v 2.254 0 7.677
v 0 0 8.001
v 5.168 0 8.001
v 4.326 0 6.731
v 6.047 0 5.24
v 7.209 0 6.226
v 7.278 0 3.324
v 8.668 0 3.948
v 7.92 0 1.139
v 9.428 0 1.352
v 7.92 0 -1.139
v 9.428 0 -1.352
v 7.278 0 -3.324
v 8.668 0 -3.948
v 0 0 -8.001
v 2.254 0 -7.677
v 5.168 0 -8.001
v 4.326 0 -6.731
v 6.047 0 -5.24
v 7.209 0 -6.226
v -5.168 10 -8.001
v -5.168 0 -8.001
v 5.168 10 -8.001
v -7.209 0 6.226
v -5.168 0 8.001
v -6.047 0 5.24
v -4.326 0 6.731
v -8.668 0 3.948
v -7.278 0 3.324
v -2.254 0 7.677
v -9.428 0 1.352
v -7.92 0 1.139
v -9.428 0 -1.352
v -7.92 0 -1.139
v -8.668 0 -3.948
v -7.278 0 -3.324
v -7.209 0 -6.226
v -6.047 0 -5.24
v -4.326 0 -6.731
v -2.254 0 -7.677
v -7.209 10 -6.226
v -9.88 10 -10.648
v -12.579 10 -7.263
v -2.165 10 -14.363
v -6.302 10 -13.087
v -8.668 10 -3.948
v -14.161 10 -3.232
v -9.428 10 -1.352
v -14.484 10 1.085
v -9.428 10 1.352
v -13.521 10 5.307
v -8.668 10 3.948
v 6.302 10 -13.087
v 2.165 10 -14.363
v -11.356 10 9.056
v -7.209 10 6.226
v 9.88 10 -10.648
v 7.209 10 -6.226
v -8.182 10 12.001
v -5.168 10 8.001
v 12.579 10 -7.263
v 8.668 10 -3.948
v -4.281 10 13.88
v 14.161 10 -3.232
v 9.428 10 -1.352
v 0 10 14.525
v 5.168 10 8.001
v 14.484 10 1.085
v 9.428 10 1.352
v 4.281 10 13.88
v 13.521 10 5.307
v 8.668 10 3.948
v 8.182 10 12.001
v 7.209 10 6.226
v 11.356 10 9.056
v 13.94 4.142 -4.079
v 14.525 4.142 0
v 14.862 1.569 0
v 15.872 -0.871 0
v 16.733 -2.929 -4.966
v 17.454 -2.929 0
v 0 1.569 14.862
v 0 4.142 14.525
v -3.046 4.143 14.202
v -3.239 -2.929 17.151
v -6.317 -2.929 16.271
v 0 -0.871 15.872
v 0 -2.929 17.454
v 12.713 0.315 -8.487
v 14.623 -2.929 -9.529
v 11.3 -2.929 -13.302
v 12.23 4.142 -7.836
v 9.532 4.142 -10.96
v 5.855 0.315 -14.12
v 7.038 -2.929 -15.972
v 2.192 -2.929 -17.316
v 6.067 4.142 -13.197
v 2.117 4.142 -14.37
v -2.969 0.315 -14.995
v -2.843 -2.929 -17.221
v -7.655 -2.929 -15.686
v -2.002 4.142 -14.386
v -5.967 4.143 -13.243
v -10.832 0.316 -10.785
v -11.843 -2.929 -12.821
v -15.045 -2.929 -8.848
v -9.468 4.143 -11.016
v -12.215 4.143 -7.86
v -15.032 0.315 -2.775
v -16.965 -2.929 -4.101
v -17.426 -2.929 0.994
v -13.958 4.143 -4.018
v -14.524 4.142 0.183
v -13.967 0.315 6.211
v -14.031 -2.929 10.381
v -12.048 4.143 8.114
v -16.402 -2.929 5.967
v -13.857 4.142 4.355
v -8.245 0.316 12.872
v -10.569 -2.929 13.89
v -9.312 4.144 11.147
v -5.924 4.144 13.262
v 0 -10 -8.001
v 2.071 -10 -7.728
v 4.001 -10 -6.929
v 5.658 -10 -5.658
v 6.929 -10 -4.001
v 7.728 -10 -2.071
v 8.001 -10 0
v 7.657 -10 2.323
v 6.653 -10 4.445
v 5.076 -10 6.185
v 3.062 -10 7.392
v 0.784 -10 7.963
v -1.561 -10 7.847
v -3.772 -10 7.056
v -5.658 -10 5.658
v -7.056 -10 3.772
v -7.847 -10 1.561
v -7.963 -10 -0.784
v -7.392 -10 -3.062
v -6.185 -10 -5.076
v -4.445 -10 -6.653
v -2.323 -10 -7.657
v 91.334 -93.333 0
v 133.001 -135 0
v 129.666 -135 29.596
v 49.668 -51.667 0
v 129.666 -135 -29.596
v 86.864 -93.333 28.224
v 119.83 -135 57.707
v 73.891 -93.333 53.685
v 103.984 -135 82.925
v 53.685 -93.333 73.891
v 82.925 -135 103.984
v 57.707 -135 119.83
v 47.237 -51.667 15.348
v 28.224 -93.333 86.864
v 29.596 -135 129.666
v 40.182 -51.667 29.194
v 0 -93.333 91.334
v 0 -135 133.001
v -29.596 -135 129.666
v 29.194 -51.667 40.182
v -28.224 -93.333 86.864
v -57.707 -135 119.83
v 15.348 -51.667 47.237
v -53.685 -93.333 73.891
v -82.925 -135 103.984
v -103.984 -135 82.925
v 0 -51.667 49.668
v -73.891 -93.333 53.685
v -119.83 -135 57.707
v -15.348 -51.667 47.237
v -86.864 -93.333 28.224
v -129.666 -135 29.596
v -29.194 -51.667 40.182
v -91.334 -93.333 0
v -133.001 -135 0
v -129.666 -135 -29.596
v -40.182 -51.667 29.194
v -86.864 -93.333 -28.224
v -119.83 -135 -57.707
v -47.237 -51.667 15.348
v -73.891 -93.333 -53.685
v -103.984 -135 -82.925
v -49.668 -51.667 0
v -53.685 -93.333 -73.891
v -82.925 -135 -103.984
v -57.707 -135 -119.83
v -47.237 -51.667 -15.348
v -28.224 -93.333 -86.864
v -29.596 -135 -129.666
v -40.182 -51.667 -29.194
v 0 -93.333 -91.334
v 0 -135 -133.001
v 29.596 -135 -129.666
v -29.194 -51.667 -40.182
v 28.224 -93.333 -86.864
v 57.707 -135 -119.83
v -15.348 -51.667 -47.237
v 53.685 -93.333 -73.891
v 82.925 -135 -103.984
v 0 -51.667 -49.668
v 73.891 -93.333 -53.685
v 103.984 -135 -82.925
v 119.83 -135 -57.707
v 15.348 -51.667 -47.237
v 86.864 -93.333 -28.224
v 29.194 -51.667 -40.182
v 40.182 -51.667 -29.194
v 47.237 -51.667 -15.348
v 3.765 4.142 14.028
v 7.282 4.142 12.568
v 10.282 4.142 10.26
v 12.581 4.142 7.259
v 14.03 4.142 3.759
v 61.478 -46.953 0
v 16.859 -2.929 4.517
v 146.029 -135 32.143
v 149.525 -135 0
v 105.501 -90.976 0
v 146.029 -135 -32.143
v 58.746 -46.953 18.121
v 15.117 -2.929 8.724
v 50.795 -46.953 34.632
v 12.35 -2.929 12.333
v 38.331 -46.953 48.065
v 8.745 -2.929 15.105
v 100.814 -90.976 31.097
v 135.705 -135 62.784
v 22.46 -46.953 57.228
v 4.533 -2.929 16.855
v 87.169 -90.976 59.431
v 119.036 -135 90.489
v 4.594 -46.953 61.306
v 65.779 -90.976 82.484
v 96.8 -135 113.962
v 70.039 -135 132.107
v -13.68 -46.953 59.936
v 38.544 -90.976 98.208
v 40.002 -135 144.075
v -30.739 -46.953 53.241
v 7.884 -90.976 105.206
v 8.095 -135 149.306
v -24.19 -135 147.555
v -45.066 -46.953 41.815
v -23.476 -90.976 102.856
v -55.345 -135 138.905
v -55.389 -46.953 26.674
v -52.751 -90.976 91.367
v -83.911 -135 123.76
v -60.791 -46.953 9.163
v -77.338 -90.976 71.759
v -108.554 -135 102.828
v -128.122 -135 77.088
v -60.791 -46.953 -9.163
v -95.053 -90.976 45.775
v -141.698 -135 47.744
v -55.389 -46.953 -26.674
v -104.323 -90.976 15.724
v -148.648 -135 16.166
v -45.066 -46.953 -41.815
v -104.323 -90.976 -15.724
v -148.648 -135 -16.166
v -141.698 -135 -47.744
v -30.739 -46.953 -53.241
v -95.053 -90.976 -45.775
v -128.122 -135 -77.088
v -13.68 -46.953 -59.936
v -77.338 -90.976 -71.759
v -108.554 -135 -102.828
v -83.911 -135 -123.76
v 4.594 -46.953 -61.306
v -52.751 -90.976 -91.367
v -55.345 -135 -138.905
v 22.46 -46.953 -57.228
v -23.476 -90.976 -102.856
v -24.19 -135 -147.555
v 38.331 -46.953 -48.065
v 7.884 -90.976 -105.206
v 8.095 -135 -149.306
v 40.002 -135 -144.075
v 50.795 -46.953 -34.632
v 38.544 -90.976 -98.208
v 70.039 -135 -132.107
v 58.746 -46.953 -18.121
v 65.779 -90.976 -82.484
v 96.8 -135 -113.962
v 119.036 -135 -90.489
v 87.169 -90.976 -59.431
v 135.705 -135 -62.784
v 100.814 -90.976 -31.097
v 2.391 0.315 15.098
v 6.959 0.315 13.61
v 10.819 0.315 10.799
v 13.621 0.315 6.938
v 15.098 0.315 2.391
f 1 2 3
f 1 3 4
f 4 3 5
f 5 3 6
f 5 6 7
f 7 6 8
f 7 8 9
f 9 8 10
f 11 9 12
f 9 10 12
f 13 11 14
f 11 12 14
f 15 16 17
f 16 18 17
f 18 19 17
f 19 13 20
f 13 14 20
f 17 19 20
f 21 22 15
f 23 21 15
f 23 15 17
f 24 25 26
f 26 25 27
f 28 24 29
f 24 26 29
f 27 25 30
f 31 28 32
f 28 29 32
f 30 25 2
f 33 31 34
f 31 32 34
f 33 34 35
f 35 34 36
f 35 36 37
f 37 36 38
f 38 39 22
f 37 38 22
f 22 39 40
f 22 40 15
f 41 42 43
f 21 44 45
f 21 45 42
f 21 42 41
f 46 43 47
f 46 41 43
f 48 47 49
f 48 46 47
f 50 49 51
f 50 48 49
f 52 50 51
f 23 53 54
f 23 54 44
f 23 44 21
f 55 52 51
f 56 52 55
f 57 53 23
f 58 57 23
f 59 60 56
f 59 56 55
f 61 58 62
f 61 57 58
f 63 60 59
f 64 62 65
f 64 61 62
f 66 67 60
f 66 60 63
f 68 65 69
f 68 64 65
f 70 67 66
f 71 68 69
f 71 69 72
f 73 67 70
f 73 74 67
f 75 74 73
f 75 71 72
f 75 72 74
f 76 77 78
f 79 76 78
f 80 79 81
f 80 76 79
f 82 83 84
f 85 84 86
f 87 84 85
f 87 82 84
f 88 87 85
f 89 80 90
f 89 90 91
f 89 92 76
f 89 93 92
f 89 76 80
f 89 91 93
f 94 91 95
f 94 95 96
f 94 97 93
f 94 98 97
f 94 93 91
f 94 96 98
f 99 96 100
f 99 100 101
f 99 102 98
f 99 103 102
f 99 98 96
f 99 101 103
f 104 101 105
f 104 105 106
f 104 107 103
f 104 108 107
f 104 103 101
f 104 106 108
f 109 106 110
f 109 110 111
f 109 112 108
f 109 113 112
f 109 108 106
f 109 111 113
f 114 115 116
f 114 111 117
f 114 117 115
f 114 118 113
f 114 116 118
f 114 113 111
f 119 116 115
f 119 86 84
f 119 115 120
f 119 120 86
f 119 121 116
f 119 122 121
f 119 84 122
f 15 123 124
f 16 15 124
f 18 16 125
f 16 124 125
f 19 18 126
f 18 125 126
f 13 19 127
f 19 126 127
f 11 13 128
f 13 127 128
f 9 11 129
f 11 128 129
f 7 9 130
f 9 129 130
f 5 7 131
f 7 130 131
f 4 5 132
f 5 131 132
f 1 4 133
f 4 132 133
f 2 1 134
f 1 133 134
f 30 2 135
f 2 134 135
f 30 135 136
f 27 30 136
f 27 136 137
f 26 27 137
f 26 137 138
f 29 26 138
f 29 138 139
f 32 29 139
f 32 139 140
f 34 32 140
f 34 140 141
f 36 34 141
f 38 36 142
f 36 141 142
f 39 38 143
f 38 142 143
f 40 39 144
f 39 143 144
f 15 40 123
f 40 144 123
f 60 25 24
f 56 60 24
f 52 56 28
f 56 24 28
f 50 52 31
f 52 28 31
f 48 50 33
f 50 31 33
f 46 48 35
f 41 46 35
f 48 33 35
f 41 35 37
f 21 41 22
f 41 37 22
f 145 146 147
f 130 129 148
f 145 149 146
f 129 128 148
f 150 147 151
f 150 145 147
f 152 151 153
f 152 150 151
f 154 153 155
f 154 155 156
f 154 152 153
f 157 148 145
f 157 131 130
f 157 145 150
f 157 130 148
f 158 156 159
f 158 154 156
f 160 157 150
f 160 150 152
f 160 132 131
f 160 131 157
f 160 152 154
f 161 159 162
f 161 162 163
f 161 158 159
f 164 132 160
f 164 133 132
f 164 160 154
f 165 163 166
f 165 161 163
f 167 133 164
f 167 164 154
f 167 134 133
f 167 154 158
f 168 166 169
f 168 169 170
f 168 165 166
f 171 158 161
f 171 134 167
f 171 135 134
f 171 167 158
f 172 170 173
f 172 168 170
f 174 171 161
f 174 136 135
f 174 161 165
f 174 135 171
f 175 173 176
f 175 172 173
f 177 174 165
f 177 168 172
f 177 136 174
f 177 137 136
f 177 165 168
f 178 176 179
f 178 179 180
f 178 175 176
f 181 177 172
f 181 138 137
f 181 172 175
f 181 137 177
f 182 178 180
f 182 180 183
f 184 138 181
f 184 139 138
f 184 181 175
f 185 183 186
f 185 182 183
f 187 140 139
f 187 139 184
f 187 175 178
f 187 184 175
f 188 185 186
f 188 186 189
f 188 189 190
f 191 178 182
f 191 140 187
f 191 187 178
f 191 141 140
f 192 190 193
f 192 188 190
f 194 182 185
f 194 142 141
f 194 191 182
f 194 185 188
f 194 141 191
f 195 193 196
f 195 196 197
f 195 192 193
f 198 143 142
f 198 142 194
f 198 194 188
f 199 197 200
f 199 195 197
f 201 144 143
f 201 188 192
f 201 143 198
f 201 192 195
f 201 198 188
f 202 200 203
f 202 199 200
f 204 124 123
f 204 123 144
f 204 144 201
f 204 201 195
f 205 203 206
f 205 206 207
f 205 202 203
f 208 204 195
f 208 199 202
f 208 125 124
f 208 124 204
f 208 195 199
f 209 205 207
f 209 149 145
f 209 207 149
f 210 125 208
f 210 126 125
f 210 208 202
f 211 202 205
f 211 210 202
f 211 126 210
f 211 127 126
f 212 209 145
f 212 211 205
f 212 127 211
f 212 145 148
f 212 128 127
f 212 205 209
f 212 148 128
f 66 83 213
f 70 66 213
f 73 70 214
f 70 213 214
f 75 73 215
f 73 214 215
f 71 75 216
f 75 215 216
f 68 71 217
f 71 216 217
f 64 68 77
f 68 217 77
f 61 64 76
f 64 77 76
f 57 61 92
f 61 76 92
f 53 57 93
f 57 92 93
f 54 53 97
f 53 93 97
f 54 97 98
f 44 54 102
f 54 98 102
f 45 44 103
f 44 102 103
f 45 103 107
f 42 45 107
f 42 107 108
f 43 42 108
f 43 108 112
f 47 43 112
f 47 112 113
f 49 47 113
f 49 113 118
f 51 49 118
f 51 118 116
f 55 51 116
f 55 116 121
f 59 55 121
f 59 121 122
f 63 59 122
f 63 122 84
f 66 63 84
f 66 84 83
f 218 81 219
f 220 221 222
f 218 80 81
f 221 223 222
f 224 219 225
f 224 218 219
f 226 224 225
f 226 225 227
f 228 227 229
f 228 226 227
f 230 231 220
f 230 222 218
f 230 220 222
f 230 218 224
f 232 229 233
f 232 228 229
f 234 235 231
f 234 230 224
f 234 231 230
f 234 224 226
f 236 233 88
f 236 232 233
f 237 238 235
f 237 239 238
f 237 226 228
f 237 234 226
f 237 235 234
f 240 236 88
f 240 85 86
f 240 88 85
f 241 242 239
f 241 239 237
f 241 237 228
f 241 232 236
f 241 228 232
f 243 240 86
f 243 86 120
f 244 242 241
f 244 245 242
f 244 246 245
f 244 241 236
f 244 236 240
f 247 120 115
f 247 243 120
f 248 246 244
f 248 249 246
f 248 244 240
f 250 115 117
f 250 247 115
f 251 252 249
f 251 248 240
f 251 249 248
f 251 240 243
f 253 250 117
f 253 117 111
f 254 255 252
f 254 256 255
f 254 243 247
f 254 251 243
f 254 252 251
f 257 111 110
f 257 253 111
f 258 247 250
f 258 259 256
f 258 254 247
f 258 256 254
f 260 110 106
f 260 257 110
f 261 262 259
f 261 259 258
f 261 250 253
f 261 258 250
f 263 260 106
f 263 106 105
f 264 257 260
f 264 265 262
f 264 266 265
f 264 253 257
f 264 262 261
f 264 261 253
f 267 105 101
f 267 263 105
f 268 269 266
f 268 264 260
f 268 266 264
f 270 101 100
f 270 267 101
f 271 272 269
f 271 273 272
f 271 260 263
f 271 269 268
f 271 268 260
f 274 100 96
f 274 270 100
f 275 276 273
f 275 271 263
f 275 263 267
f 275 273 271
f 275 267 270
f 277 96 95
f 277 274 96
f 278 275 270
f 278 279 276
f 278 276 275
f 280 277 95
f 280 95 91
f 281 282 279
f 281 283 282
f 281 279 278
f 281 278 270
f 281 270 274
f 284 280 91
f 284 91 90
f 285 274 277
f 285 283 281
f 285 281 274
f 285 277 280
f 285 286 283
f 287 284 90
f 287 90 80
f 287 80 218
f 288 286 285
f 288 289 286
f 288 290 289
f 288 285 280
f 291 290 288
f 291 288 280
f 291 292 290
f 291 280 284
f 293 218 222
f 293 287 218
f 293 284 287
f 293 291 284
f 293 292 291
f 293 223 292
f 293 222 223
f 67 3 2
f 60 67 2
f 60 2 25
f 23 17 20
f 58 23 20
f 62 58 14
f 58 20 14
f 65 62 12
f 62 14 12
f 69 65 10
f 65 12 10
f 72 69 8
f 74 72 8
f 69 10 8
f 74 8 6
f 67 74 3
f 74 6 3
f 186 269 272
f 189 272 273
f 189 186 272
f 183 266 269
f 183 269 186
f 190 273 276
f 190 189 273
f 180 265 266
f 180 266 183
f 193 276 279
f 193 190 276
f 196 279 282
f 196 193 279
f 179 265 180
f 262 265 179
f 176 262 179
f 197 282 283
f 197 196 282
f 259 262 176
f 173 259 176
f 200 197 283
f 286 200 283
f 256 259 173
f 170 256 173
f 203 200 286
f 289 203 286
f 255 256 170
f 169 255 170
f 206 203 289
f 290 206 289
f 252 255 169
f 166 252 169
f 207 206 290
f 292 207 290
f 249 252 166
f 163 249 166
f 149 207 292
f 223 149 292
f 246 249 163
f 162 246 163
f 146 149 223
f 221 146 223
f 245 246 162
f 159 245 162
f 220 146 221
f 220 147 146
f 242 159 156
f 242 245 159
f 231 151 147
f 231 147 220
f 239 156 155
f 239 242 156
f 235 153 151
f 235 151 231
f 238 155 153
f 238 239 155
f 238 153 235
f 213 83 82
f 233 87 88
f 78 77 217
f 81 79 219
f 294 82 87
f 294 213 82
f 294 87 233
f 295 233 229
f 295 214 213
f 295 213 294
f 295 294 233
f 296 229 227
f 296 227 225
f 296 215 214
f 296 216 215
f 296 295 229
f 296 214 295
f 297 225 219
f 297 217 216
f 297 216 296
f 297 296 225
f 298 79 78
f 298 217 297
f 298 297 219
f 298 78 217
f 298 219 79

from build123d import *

# Parameters (mm, degrees)
SKETCH1_R                                   = 14.525
KEYED_PORTION_ADAPTER_DEPTH                 = 10
STOPPER_START                               = 10
SKETCH2_R                                   = 14.525
SKETCH2_R_2                                 = 8.001087489
STOPPER_ON_THREADED_PORTION_OF_PISTON_DEPTH = 10
PISTON_HOLDER_TO_CONICAL_BASE_ADAPTER_R     = 10


with BuildPart() as part:
    # Sketch1 → Keyed portion adapter (new body)
    with BuildSketch(Plane(origin=(0, 0, 0), x_dir=(1, 0, 0), z_dir=(0, 1, 0))):
        with Locations(Location((0, 0, 0), (0, 0, 270))):
            Circle(SKETCH1_R)
        with BuildLine():
            Line((-5.168, 8.001087489), (5.168, 8.001087489))
            ThreePointArc((5.168, 8.001087489), (9.525, 0), (5.168, -8.001087489))
            Line((5.168, -8.001087489), (-5.168, -8.001087489))
            ThreePointArc((-5.168, -8.001087489), (-9.525, 0), (-5.168, 8.001087489))
        make_face(mode=Mode.SUBTRACT)
    extrude(amount=KEYED_PORTION_ADAPTER_DEPTH)

    # Sketch2 → Stopper (on threaded portion of piston) (add)
    with BuildSketch(Plane.XZ.offset(STOPPER_START)):
        with Locations(Location((0, 0, 0), (0, 0, 270))):
            Circle(SKETCH2_R)
        with Locations(Location((0, 0, 0), (0, 0, 270))):
            Circle(SKETCH2_R_2, mode=Mode.SUBTRACT)
    extrude(amount=-STOPPER_ON_THREADED_PORTION_OF_PISTON_DEPTH)

    # Sketch3 → Conical base (revolve)
    with BuildSketch(Plane.XY):
        Polygon((8.001087489, -10), (8.001087489, 0), (14.525, 0), (149.525, -135), (133.001087489, -135), align=None)
    revolve(axis=Axis((0, 0, 0), (0, -1, 0)))

    # Piston holder to conical base adapter
    piston_holder_to_conical_base_adapter_edges = [part.edges().sort_by_distance(p)[0] for p in [
        (-10.270725997, 0, -10.270725997),
    ]]
    fillet(piston_holder_to_conical_base_adapter_edges, radius=PISTON_HOLDER_TO_CONICAL_BASE_ADAPTER_R)


solid = part.part
